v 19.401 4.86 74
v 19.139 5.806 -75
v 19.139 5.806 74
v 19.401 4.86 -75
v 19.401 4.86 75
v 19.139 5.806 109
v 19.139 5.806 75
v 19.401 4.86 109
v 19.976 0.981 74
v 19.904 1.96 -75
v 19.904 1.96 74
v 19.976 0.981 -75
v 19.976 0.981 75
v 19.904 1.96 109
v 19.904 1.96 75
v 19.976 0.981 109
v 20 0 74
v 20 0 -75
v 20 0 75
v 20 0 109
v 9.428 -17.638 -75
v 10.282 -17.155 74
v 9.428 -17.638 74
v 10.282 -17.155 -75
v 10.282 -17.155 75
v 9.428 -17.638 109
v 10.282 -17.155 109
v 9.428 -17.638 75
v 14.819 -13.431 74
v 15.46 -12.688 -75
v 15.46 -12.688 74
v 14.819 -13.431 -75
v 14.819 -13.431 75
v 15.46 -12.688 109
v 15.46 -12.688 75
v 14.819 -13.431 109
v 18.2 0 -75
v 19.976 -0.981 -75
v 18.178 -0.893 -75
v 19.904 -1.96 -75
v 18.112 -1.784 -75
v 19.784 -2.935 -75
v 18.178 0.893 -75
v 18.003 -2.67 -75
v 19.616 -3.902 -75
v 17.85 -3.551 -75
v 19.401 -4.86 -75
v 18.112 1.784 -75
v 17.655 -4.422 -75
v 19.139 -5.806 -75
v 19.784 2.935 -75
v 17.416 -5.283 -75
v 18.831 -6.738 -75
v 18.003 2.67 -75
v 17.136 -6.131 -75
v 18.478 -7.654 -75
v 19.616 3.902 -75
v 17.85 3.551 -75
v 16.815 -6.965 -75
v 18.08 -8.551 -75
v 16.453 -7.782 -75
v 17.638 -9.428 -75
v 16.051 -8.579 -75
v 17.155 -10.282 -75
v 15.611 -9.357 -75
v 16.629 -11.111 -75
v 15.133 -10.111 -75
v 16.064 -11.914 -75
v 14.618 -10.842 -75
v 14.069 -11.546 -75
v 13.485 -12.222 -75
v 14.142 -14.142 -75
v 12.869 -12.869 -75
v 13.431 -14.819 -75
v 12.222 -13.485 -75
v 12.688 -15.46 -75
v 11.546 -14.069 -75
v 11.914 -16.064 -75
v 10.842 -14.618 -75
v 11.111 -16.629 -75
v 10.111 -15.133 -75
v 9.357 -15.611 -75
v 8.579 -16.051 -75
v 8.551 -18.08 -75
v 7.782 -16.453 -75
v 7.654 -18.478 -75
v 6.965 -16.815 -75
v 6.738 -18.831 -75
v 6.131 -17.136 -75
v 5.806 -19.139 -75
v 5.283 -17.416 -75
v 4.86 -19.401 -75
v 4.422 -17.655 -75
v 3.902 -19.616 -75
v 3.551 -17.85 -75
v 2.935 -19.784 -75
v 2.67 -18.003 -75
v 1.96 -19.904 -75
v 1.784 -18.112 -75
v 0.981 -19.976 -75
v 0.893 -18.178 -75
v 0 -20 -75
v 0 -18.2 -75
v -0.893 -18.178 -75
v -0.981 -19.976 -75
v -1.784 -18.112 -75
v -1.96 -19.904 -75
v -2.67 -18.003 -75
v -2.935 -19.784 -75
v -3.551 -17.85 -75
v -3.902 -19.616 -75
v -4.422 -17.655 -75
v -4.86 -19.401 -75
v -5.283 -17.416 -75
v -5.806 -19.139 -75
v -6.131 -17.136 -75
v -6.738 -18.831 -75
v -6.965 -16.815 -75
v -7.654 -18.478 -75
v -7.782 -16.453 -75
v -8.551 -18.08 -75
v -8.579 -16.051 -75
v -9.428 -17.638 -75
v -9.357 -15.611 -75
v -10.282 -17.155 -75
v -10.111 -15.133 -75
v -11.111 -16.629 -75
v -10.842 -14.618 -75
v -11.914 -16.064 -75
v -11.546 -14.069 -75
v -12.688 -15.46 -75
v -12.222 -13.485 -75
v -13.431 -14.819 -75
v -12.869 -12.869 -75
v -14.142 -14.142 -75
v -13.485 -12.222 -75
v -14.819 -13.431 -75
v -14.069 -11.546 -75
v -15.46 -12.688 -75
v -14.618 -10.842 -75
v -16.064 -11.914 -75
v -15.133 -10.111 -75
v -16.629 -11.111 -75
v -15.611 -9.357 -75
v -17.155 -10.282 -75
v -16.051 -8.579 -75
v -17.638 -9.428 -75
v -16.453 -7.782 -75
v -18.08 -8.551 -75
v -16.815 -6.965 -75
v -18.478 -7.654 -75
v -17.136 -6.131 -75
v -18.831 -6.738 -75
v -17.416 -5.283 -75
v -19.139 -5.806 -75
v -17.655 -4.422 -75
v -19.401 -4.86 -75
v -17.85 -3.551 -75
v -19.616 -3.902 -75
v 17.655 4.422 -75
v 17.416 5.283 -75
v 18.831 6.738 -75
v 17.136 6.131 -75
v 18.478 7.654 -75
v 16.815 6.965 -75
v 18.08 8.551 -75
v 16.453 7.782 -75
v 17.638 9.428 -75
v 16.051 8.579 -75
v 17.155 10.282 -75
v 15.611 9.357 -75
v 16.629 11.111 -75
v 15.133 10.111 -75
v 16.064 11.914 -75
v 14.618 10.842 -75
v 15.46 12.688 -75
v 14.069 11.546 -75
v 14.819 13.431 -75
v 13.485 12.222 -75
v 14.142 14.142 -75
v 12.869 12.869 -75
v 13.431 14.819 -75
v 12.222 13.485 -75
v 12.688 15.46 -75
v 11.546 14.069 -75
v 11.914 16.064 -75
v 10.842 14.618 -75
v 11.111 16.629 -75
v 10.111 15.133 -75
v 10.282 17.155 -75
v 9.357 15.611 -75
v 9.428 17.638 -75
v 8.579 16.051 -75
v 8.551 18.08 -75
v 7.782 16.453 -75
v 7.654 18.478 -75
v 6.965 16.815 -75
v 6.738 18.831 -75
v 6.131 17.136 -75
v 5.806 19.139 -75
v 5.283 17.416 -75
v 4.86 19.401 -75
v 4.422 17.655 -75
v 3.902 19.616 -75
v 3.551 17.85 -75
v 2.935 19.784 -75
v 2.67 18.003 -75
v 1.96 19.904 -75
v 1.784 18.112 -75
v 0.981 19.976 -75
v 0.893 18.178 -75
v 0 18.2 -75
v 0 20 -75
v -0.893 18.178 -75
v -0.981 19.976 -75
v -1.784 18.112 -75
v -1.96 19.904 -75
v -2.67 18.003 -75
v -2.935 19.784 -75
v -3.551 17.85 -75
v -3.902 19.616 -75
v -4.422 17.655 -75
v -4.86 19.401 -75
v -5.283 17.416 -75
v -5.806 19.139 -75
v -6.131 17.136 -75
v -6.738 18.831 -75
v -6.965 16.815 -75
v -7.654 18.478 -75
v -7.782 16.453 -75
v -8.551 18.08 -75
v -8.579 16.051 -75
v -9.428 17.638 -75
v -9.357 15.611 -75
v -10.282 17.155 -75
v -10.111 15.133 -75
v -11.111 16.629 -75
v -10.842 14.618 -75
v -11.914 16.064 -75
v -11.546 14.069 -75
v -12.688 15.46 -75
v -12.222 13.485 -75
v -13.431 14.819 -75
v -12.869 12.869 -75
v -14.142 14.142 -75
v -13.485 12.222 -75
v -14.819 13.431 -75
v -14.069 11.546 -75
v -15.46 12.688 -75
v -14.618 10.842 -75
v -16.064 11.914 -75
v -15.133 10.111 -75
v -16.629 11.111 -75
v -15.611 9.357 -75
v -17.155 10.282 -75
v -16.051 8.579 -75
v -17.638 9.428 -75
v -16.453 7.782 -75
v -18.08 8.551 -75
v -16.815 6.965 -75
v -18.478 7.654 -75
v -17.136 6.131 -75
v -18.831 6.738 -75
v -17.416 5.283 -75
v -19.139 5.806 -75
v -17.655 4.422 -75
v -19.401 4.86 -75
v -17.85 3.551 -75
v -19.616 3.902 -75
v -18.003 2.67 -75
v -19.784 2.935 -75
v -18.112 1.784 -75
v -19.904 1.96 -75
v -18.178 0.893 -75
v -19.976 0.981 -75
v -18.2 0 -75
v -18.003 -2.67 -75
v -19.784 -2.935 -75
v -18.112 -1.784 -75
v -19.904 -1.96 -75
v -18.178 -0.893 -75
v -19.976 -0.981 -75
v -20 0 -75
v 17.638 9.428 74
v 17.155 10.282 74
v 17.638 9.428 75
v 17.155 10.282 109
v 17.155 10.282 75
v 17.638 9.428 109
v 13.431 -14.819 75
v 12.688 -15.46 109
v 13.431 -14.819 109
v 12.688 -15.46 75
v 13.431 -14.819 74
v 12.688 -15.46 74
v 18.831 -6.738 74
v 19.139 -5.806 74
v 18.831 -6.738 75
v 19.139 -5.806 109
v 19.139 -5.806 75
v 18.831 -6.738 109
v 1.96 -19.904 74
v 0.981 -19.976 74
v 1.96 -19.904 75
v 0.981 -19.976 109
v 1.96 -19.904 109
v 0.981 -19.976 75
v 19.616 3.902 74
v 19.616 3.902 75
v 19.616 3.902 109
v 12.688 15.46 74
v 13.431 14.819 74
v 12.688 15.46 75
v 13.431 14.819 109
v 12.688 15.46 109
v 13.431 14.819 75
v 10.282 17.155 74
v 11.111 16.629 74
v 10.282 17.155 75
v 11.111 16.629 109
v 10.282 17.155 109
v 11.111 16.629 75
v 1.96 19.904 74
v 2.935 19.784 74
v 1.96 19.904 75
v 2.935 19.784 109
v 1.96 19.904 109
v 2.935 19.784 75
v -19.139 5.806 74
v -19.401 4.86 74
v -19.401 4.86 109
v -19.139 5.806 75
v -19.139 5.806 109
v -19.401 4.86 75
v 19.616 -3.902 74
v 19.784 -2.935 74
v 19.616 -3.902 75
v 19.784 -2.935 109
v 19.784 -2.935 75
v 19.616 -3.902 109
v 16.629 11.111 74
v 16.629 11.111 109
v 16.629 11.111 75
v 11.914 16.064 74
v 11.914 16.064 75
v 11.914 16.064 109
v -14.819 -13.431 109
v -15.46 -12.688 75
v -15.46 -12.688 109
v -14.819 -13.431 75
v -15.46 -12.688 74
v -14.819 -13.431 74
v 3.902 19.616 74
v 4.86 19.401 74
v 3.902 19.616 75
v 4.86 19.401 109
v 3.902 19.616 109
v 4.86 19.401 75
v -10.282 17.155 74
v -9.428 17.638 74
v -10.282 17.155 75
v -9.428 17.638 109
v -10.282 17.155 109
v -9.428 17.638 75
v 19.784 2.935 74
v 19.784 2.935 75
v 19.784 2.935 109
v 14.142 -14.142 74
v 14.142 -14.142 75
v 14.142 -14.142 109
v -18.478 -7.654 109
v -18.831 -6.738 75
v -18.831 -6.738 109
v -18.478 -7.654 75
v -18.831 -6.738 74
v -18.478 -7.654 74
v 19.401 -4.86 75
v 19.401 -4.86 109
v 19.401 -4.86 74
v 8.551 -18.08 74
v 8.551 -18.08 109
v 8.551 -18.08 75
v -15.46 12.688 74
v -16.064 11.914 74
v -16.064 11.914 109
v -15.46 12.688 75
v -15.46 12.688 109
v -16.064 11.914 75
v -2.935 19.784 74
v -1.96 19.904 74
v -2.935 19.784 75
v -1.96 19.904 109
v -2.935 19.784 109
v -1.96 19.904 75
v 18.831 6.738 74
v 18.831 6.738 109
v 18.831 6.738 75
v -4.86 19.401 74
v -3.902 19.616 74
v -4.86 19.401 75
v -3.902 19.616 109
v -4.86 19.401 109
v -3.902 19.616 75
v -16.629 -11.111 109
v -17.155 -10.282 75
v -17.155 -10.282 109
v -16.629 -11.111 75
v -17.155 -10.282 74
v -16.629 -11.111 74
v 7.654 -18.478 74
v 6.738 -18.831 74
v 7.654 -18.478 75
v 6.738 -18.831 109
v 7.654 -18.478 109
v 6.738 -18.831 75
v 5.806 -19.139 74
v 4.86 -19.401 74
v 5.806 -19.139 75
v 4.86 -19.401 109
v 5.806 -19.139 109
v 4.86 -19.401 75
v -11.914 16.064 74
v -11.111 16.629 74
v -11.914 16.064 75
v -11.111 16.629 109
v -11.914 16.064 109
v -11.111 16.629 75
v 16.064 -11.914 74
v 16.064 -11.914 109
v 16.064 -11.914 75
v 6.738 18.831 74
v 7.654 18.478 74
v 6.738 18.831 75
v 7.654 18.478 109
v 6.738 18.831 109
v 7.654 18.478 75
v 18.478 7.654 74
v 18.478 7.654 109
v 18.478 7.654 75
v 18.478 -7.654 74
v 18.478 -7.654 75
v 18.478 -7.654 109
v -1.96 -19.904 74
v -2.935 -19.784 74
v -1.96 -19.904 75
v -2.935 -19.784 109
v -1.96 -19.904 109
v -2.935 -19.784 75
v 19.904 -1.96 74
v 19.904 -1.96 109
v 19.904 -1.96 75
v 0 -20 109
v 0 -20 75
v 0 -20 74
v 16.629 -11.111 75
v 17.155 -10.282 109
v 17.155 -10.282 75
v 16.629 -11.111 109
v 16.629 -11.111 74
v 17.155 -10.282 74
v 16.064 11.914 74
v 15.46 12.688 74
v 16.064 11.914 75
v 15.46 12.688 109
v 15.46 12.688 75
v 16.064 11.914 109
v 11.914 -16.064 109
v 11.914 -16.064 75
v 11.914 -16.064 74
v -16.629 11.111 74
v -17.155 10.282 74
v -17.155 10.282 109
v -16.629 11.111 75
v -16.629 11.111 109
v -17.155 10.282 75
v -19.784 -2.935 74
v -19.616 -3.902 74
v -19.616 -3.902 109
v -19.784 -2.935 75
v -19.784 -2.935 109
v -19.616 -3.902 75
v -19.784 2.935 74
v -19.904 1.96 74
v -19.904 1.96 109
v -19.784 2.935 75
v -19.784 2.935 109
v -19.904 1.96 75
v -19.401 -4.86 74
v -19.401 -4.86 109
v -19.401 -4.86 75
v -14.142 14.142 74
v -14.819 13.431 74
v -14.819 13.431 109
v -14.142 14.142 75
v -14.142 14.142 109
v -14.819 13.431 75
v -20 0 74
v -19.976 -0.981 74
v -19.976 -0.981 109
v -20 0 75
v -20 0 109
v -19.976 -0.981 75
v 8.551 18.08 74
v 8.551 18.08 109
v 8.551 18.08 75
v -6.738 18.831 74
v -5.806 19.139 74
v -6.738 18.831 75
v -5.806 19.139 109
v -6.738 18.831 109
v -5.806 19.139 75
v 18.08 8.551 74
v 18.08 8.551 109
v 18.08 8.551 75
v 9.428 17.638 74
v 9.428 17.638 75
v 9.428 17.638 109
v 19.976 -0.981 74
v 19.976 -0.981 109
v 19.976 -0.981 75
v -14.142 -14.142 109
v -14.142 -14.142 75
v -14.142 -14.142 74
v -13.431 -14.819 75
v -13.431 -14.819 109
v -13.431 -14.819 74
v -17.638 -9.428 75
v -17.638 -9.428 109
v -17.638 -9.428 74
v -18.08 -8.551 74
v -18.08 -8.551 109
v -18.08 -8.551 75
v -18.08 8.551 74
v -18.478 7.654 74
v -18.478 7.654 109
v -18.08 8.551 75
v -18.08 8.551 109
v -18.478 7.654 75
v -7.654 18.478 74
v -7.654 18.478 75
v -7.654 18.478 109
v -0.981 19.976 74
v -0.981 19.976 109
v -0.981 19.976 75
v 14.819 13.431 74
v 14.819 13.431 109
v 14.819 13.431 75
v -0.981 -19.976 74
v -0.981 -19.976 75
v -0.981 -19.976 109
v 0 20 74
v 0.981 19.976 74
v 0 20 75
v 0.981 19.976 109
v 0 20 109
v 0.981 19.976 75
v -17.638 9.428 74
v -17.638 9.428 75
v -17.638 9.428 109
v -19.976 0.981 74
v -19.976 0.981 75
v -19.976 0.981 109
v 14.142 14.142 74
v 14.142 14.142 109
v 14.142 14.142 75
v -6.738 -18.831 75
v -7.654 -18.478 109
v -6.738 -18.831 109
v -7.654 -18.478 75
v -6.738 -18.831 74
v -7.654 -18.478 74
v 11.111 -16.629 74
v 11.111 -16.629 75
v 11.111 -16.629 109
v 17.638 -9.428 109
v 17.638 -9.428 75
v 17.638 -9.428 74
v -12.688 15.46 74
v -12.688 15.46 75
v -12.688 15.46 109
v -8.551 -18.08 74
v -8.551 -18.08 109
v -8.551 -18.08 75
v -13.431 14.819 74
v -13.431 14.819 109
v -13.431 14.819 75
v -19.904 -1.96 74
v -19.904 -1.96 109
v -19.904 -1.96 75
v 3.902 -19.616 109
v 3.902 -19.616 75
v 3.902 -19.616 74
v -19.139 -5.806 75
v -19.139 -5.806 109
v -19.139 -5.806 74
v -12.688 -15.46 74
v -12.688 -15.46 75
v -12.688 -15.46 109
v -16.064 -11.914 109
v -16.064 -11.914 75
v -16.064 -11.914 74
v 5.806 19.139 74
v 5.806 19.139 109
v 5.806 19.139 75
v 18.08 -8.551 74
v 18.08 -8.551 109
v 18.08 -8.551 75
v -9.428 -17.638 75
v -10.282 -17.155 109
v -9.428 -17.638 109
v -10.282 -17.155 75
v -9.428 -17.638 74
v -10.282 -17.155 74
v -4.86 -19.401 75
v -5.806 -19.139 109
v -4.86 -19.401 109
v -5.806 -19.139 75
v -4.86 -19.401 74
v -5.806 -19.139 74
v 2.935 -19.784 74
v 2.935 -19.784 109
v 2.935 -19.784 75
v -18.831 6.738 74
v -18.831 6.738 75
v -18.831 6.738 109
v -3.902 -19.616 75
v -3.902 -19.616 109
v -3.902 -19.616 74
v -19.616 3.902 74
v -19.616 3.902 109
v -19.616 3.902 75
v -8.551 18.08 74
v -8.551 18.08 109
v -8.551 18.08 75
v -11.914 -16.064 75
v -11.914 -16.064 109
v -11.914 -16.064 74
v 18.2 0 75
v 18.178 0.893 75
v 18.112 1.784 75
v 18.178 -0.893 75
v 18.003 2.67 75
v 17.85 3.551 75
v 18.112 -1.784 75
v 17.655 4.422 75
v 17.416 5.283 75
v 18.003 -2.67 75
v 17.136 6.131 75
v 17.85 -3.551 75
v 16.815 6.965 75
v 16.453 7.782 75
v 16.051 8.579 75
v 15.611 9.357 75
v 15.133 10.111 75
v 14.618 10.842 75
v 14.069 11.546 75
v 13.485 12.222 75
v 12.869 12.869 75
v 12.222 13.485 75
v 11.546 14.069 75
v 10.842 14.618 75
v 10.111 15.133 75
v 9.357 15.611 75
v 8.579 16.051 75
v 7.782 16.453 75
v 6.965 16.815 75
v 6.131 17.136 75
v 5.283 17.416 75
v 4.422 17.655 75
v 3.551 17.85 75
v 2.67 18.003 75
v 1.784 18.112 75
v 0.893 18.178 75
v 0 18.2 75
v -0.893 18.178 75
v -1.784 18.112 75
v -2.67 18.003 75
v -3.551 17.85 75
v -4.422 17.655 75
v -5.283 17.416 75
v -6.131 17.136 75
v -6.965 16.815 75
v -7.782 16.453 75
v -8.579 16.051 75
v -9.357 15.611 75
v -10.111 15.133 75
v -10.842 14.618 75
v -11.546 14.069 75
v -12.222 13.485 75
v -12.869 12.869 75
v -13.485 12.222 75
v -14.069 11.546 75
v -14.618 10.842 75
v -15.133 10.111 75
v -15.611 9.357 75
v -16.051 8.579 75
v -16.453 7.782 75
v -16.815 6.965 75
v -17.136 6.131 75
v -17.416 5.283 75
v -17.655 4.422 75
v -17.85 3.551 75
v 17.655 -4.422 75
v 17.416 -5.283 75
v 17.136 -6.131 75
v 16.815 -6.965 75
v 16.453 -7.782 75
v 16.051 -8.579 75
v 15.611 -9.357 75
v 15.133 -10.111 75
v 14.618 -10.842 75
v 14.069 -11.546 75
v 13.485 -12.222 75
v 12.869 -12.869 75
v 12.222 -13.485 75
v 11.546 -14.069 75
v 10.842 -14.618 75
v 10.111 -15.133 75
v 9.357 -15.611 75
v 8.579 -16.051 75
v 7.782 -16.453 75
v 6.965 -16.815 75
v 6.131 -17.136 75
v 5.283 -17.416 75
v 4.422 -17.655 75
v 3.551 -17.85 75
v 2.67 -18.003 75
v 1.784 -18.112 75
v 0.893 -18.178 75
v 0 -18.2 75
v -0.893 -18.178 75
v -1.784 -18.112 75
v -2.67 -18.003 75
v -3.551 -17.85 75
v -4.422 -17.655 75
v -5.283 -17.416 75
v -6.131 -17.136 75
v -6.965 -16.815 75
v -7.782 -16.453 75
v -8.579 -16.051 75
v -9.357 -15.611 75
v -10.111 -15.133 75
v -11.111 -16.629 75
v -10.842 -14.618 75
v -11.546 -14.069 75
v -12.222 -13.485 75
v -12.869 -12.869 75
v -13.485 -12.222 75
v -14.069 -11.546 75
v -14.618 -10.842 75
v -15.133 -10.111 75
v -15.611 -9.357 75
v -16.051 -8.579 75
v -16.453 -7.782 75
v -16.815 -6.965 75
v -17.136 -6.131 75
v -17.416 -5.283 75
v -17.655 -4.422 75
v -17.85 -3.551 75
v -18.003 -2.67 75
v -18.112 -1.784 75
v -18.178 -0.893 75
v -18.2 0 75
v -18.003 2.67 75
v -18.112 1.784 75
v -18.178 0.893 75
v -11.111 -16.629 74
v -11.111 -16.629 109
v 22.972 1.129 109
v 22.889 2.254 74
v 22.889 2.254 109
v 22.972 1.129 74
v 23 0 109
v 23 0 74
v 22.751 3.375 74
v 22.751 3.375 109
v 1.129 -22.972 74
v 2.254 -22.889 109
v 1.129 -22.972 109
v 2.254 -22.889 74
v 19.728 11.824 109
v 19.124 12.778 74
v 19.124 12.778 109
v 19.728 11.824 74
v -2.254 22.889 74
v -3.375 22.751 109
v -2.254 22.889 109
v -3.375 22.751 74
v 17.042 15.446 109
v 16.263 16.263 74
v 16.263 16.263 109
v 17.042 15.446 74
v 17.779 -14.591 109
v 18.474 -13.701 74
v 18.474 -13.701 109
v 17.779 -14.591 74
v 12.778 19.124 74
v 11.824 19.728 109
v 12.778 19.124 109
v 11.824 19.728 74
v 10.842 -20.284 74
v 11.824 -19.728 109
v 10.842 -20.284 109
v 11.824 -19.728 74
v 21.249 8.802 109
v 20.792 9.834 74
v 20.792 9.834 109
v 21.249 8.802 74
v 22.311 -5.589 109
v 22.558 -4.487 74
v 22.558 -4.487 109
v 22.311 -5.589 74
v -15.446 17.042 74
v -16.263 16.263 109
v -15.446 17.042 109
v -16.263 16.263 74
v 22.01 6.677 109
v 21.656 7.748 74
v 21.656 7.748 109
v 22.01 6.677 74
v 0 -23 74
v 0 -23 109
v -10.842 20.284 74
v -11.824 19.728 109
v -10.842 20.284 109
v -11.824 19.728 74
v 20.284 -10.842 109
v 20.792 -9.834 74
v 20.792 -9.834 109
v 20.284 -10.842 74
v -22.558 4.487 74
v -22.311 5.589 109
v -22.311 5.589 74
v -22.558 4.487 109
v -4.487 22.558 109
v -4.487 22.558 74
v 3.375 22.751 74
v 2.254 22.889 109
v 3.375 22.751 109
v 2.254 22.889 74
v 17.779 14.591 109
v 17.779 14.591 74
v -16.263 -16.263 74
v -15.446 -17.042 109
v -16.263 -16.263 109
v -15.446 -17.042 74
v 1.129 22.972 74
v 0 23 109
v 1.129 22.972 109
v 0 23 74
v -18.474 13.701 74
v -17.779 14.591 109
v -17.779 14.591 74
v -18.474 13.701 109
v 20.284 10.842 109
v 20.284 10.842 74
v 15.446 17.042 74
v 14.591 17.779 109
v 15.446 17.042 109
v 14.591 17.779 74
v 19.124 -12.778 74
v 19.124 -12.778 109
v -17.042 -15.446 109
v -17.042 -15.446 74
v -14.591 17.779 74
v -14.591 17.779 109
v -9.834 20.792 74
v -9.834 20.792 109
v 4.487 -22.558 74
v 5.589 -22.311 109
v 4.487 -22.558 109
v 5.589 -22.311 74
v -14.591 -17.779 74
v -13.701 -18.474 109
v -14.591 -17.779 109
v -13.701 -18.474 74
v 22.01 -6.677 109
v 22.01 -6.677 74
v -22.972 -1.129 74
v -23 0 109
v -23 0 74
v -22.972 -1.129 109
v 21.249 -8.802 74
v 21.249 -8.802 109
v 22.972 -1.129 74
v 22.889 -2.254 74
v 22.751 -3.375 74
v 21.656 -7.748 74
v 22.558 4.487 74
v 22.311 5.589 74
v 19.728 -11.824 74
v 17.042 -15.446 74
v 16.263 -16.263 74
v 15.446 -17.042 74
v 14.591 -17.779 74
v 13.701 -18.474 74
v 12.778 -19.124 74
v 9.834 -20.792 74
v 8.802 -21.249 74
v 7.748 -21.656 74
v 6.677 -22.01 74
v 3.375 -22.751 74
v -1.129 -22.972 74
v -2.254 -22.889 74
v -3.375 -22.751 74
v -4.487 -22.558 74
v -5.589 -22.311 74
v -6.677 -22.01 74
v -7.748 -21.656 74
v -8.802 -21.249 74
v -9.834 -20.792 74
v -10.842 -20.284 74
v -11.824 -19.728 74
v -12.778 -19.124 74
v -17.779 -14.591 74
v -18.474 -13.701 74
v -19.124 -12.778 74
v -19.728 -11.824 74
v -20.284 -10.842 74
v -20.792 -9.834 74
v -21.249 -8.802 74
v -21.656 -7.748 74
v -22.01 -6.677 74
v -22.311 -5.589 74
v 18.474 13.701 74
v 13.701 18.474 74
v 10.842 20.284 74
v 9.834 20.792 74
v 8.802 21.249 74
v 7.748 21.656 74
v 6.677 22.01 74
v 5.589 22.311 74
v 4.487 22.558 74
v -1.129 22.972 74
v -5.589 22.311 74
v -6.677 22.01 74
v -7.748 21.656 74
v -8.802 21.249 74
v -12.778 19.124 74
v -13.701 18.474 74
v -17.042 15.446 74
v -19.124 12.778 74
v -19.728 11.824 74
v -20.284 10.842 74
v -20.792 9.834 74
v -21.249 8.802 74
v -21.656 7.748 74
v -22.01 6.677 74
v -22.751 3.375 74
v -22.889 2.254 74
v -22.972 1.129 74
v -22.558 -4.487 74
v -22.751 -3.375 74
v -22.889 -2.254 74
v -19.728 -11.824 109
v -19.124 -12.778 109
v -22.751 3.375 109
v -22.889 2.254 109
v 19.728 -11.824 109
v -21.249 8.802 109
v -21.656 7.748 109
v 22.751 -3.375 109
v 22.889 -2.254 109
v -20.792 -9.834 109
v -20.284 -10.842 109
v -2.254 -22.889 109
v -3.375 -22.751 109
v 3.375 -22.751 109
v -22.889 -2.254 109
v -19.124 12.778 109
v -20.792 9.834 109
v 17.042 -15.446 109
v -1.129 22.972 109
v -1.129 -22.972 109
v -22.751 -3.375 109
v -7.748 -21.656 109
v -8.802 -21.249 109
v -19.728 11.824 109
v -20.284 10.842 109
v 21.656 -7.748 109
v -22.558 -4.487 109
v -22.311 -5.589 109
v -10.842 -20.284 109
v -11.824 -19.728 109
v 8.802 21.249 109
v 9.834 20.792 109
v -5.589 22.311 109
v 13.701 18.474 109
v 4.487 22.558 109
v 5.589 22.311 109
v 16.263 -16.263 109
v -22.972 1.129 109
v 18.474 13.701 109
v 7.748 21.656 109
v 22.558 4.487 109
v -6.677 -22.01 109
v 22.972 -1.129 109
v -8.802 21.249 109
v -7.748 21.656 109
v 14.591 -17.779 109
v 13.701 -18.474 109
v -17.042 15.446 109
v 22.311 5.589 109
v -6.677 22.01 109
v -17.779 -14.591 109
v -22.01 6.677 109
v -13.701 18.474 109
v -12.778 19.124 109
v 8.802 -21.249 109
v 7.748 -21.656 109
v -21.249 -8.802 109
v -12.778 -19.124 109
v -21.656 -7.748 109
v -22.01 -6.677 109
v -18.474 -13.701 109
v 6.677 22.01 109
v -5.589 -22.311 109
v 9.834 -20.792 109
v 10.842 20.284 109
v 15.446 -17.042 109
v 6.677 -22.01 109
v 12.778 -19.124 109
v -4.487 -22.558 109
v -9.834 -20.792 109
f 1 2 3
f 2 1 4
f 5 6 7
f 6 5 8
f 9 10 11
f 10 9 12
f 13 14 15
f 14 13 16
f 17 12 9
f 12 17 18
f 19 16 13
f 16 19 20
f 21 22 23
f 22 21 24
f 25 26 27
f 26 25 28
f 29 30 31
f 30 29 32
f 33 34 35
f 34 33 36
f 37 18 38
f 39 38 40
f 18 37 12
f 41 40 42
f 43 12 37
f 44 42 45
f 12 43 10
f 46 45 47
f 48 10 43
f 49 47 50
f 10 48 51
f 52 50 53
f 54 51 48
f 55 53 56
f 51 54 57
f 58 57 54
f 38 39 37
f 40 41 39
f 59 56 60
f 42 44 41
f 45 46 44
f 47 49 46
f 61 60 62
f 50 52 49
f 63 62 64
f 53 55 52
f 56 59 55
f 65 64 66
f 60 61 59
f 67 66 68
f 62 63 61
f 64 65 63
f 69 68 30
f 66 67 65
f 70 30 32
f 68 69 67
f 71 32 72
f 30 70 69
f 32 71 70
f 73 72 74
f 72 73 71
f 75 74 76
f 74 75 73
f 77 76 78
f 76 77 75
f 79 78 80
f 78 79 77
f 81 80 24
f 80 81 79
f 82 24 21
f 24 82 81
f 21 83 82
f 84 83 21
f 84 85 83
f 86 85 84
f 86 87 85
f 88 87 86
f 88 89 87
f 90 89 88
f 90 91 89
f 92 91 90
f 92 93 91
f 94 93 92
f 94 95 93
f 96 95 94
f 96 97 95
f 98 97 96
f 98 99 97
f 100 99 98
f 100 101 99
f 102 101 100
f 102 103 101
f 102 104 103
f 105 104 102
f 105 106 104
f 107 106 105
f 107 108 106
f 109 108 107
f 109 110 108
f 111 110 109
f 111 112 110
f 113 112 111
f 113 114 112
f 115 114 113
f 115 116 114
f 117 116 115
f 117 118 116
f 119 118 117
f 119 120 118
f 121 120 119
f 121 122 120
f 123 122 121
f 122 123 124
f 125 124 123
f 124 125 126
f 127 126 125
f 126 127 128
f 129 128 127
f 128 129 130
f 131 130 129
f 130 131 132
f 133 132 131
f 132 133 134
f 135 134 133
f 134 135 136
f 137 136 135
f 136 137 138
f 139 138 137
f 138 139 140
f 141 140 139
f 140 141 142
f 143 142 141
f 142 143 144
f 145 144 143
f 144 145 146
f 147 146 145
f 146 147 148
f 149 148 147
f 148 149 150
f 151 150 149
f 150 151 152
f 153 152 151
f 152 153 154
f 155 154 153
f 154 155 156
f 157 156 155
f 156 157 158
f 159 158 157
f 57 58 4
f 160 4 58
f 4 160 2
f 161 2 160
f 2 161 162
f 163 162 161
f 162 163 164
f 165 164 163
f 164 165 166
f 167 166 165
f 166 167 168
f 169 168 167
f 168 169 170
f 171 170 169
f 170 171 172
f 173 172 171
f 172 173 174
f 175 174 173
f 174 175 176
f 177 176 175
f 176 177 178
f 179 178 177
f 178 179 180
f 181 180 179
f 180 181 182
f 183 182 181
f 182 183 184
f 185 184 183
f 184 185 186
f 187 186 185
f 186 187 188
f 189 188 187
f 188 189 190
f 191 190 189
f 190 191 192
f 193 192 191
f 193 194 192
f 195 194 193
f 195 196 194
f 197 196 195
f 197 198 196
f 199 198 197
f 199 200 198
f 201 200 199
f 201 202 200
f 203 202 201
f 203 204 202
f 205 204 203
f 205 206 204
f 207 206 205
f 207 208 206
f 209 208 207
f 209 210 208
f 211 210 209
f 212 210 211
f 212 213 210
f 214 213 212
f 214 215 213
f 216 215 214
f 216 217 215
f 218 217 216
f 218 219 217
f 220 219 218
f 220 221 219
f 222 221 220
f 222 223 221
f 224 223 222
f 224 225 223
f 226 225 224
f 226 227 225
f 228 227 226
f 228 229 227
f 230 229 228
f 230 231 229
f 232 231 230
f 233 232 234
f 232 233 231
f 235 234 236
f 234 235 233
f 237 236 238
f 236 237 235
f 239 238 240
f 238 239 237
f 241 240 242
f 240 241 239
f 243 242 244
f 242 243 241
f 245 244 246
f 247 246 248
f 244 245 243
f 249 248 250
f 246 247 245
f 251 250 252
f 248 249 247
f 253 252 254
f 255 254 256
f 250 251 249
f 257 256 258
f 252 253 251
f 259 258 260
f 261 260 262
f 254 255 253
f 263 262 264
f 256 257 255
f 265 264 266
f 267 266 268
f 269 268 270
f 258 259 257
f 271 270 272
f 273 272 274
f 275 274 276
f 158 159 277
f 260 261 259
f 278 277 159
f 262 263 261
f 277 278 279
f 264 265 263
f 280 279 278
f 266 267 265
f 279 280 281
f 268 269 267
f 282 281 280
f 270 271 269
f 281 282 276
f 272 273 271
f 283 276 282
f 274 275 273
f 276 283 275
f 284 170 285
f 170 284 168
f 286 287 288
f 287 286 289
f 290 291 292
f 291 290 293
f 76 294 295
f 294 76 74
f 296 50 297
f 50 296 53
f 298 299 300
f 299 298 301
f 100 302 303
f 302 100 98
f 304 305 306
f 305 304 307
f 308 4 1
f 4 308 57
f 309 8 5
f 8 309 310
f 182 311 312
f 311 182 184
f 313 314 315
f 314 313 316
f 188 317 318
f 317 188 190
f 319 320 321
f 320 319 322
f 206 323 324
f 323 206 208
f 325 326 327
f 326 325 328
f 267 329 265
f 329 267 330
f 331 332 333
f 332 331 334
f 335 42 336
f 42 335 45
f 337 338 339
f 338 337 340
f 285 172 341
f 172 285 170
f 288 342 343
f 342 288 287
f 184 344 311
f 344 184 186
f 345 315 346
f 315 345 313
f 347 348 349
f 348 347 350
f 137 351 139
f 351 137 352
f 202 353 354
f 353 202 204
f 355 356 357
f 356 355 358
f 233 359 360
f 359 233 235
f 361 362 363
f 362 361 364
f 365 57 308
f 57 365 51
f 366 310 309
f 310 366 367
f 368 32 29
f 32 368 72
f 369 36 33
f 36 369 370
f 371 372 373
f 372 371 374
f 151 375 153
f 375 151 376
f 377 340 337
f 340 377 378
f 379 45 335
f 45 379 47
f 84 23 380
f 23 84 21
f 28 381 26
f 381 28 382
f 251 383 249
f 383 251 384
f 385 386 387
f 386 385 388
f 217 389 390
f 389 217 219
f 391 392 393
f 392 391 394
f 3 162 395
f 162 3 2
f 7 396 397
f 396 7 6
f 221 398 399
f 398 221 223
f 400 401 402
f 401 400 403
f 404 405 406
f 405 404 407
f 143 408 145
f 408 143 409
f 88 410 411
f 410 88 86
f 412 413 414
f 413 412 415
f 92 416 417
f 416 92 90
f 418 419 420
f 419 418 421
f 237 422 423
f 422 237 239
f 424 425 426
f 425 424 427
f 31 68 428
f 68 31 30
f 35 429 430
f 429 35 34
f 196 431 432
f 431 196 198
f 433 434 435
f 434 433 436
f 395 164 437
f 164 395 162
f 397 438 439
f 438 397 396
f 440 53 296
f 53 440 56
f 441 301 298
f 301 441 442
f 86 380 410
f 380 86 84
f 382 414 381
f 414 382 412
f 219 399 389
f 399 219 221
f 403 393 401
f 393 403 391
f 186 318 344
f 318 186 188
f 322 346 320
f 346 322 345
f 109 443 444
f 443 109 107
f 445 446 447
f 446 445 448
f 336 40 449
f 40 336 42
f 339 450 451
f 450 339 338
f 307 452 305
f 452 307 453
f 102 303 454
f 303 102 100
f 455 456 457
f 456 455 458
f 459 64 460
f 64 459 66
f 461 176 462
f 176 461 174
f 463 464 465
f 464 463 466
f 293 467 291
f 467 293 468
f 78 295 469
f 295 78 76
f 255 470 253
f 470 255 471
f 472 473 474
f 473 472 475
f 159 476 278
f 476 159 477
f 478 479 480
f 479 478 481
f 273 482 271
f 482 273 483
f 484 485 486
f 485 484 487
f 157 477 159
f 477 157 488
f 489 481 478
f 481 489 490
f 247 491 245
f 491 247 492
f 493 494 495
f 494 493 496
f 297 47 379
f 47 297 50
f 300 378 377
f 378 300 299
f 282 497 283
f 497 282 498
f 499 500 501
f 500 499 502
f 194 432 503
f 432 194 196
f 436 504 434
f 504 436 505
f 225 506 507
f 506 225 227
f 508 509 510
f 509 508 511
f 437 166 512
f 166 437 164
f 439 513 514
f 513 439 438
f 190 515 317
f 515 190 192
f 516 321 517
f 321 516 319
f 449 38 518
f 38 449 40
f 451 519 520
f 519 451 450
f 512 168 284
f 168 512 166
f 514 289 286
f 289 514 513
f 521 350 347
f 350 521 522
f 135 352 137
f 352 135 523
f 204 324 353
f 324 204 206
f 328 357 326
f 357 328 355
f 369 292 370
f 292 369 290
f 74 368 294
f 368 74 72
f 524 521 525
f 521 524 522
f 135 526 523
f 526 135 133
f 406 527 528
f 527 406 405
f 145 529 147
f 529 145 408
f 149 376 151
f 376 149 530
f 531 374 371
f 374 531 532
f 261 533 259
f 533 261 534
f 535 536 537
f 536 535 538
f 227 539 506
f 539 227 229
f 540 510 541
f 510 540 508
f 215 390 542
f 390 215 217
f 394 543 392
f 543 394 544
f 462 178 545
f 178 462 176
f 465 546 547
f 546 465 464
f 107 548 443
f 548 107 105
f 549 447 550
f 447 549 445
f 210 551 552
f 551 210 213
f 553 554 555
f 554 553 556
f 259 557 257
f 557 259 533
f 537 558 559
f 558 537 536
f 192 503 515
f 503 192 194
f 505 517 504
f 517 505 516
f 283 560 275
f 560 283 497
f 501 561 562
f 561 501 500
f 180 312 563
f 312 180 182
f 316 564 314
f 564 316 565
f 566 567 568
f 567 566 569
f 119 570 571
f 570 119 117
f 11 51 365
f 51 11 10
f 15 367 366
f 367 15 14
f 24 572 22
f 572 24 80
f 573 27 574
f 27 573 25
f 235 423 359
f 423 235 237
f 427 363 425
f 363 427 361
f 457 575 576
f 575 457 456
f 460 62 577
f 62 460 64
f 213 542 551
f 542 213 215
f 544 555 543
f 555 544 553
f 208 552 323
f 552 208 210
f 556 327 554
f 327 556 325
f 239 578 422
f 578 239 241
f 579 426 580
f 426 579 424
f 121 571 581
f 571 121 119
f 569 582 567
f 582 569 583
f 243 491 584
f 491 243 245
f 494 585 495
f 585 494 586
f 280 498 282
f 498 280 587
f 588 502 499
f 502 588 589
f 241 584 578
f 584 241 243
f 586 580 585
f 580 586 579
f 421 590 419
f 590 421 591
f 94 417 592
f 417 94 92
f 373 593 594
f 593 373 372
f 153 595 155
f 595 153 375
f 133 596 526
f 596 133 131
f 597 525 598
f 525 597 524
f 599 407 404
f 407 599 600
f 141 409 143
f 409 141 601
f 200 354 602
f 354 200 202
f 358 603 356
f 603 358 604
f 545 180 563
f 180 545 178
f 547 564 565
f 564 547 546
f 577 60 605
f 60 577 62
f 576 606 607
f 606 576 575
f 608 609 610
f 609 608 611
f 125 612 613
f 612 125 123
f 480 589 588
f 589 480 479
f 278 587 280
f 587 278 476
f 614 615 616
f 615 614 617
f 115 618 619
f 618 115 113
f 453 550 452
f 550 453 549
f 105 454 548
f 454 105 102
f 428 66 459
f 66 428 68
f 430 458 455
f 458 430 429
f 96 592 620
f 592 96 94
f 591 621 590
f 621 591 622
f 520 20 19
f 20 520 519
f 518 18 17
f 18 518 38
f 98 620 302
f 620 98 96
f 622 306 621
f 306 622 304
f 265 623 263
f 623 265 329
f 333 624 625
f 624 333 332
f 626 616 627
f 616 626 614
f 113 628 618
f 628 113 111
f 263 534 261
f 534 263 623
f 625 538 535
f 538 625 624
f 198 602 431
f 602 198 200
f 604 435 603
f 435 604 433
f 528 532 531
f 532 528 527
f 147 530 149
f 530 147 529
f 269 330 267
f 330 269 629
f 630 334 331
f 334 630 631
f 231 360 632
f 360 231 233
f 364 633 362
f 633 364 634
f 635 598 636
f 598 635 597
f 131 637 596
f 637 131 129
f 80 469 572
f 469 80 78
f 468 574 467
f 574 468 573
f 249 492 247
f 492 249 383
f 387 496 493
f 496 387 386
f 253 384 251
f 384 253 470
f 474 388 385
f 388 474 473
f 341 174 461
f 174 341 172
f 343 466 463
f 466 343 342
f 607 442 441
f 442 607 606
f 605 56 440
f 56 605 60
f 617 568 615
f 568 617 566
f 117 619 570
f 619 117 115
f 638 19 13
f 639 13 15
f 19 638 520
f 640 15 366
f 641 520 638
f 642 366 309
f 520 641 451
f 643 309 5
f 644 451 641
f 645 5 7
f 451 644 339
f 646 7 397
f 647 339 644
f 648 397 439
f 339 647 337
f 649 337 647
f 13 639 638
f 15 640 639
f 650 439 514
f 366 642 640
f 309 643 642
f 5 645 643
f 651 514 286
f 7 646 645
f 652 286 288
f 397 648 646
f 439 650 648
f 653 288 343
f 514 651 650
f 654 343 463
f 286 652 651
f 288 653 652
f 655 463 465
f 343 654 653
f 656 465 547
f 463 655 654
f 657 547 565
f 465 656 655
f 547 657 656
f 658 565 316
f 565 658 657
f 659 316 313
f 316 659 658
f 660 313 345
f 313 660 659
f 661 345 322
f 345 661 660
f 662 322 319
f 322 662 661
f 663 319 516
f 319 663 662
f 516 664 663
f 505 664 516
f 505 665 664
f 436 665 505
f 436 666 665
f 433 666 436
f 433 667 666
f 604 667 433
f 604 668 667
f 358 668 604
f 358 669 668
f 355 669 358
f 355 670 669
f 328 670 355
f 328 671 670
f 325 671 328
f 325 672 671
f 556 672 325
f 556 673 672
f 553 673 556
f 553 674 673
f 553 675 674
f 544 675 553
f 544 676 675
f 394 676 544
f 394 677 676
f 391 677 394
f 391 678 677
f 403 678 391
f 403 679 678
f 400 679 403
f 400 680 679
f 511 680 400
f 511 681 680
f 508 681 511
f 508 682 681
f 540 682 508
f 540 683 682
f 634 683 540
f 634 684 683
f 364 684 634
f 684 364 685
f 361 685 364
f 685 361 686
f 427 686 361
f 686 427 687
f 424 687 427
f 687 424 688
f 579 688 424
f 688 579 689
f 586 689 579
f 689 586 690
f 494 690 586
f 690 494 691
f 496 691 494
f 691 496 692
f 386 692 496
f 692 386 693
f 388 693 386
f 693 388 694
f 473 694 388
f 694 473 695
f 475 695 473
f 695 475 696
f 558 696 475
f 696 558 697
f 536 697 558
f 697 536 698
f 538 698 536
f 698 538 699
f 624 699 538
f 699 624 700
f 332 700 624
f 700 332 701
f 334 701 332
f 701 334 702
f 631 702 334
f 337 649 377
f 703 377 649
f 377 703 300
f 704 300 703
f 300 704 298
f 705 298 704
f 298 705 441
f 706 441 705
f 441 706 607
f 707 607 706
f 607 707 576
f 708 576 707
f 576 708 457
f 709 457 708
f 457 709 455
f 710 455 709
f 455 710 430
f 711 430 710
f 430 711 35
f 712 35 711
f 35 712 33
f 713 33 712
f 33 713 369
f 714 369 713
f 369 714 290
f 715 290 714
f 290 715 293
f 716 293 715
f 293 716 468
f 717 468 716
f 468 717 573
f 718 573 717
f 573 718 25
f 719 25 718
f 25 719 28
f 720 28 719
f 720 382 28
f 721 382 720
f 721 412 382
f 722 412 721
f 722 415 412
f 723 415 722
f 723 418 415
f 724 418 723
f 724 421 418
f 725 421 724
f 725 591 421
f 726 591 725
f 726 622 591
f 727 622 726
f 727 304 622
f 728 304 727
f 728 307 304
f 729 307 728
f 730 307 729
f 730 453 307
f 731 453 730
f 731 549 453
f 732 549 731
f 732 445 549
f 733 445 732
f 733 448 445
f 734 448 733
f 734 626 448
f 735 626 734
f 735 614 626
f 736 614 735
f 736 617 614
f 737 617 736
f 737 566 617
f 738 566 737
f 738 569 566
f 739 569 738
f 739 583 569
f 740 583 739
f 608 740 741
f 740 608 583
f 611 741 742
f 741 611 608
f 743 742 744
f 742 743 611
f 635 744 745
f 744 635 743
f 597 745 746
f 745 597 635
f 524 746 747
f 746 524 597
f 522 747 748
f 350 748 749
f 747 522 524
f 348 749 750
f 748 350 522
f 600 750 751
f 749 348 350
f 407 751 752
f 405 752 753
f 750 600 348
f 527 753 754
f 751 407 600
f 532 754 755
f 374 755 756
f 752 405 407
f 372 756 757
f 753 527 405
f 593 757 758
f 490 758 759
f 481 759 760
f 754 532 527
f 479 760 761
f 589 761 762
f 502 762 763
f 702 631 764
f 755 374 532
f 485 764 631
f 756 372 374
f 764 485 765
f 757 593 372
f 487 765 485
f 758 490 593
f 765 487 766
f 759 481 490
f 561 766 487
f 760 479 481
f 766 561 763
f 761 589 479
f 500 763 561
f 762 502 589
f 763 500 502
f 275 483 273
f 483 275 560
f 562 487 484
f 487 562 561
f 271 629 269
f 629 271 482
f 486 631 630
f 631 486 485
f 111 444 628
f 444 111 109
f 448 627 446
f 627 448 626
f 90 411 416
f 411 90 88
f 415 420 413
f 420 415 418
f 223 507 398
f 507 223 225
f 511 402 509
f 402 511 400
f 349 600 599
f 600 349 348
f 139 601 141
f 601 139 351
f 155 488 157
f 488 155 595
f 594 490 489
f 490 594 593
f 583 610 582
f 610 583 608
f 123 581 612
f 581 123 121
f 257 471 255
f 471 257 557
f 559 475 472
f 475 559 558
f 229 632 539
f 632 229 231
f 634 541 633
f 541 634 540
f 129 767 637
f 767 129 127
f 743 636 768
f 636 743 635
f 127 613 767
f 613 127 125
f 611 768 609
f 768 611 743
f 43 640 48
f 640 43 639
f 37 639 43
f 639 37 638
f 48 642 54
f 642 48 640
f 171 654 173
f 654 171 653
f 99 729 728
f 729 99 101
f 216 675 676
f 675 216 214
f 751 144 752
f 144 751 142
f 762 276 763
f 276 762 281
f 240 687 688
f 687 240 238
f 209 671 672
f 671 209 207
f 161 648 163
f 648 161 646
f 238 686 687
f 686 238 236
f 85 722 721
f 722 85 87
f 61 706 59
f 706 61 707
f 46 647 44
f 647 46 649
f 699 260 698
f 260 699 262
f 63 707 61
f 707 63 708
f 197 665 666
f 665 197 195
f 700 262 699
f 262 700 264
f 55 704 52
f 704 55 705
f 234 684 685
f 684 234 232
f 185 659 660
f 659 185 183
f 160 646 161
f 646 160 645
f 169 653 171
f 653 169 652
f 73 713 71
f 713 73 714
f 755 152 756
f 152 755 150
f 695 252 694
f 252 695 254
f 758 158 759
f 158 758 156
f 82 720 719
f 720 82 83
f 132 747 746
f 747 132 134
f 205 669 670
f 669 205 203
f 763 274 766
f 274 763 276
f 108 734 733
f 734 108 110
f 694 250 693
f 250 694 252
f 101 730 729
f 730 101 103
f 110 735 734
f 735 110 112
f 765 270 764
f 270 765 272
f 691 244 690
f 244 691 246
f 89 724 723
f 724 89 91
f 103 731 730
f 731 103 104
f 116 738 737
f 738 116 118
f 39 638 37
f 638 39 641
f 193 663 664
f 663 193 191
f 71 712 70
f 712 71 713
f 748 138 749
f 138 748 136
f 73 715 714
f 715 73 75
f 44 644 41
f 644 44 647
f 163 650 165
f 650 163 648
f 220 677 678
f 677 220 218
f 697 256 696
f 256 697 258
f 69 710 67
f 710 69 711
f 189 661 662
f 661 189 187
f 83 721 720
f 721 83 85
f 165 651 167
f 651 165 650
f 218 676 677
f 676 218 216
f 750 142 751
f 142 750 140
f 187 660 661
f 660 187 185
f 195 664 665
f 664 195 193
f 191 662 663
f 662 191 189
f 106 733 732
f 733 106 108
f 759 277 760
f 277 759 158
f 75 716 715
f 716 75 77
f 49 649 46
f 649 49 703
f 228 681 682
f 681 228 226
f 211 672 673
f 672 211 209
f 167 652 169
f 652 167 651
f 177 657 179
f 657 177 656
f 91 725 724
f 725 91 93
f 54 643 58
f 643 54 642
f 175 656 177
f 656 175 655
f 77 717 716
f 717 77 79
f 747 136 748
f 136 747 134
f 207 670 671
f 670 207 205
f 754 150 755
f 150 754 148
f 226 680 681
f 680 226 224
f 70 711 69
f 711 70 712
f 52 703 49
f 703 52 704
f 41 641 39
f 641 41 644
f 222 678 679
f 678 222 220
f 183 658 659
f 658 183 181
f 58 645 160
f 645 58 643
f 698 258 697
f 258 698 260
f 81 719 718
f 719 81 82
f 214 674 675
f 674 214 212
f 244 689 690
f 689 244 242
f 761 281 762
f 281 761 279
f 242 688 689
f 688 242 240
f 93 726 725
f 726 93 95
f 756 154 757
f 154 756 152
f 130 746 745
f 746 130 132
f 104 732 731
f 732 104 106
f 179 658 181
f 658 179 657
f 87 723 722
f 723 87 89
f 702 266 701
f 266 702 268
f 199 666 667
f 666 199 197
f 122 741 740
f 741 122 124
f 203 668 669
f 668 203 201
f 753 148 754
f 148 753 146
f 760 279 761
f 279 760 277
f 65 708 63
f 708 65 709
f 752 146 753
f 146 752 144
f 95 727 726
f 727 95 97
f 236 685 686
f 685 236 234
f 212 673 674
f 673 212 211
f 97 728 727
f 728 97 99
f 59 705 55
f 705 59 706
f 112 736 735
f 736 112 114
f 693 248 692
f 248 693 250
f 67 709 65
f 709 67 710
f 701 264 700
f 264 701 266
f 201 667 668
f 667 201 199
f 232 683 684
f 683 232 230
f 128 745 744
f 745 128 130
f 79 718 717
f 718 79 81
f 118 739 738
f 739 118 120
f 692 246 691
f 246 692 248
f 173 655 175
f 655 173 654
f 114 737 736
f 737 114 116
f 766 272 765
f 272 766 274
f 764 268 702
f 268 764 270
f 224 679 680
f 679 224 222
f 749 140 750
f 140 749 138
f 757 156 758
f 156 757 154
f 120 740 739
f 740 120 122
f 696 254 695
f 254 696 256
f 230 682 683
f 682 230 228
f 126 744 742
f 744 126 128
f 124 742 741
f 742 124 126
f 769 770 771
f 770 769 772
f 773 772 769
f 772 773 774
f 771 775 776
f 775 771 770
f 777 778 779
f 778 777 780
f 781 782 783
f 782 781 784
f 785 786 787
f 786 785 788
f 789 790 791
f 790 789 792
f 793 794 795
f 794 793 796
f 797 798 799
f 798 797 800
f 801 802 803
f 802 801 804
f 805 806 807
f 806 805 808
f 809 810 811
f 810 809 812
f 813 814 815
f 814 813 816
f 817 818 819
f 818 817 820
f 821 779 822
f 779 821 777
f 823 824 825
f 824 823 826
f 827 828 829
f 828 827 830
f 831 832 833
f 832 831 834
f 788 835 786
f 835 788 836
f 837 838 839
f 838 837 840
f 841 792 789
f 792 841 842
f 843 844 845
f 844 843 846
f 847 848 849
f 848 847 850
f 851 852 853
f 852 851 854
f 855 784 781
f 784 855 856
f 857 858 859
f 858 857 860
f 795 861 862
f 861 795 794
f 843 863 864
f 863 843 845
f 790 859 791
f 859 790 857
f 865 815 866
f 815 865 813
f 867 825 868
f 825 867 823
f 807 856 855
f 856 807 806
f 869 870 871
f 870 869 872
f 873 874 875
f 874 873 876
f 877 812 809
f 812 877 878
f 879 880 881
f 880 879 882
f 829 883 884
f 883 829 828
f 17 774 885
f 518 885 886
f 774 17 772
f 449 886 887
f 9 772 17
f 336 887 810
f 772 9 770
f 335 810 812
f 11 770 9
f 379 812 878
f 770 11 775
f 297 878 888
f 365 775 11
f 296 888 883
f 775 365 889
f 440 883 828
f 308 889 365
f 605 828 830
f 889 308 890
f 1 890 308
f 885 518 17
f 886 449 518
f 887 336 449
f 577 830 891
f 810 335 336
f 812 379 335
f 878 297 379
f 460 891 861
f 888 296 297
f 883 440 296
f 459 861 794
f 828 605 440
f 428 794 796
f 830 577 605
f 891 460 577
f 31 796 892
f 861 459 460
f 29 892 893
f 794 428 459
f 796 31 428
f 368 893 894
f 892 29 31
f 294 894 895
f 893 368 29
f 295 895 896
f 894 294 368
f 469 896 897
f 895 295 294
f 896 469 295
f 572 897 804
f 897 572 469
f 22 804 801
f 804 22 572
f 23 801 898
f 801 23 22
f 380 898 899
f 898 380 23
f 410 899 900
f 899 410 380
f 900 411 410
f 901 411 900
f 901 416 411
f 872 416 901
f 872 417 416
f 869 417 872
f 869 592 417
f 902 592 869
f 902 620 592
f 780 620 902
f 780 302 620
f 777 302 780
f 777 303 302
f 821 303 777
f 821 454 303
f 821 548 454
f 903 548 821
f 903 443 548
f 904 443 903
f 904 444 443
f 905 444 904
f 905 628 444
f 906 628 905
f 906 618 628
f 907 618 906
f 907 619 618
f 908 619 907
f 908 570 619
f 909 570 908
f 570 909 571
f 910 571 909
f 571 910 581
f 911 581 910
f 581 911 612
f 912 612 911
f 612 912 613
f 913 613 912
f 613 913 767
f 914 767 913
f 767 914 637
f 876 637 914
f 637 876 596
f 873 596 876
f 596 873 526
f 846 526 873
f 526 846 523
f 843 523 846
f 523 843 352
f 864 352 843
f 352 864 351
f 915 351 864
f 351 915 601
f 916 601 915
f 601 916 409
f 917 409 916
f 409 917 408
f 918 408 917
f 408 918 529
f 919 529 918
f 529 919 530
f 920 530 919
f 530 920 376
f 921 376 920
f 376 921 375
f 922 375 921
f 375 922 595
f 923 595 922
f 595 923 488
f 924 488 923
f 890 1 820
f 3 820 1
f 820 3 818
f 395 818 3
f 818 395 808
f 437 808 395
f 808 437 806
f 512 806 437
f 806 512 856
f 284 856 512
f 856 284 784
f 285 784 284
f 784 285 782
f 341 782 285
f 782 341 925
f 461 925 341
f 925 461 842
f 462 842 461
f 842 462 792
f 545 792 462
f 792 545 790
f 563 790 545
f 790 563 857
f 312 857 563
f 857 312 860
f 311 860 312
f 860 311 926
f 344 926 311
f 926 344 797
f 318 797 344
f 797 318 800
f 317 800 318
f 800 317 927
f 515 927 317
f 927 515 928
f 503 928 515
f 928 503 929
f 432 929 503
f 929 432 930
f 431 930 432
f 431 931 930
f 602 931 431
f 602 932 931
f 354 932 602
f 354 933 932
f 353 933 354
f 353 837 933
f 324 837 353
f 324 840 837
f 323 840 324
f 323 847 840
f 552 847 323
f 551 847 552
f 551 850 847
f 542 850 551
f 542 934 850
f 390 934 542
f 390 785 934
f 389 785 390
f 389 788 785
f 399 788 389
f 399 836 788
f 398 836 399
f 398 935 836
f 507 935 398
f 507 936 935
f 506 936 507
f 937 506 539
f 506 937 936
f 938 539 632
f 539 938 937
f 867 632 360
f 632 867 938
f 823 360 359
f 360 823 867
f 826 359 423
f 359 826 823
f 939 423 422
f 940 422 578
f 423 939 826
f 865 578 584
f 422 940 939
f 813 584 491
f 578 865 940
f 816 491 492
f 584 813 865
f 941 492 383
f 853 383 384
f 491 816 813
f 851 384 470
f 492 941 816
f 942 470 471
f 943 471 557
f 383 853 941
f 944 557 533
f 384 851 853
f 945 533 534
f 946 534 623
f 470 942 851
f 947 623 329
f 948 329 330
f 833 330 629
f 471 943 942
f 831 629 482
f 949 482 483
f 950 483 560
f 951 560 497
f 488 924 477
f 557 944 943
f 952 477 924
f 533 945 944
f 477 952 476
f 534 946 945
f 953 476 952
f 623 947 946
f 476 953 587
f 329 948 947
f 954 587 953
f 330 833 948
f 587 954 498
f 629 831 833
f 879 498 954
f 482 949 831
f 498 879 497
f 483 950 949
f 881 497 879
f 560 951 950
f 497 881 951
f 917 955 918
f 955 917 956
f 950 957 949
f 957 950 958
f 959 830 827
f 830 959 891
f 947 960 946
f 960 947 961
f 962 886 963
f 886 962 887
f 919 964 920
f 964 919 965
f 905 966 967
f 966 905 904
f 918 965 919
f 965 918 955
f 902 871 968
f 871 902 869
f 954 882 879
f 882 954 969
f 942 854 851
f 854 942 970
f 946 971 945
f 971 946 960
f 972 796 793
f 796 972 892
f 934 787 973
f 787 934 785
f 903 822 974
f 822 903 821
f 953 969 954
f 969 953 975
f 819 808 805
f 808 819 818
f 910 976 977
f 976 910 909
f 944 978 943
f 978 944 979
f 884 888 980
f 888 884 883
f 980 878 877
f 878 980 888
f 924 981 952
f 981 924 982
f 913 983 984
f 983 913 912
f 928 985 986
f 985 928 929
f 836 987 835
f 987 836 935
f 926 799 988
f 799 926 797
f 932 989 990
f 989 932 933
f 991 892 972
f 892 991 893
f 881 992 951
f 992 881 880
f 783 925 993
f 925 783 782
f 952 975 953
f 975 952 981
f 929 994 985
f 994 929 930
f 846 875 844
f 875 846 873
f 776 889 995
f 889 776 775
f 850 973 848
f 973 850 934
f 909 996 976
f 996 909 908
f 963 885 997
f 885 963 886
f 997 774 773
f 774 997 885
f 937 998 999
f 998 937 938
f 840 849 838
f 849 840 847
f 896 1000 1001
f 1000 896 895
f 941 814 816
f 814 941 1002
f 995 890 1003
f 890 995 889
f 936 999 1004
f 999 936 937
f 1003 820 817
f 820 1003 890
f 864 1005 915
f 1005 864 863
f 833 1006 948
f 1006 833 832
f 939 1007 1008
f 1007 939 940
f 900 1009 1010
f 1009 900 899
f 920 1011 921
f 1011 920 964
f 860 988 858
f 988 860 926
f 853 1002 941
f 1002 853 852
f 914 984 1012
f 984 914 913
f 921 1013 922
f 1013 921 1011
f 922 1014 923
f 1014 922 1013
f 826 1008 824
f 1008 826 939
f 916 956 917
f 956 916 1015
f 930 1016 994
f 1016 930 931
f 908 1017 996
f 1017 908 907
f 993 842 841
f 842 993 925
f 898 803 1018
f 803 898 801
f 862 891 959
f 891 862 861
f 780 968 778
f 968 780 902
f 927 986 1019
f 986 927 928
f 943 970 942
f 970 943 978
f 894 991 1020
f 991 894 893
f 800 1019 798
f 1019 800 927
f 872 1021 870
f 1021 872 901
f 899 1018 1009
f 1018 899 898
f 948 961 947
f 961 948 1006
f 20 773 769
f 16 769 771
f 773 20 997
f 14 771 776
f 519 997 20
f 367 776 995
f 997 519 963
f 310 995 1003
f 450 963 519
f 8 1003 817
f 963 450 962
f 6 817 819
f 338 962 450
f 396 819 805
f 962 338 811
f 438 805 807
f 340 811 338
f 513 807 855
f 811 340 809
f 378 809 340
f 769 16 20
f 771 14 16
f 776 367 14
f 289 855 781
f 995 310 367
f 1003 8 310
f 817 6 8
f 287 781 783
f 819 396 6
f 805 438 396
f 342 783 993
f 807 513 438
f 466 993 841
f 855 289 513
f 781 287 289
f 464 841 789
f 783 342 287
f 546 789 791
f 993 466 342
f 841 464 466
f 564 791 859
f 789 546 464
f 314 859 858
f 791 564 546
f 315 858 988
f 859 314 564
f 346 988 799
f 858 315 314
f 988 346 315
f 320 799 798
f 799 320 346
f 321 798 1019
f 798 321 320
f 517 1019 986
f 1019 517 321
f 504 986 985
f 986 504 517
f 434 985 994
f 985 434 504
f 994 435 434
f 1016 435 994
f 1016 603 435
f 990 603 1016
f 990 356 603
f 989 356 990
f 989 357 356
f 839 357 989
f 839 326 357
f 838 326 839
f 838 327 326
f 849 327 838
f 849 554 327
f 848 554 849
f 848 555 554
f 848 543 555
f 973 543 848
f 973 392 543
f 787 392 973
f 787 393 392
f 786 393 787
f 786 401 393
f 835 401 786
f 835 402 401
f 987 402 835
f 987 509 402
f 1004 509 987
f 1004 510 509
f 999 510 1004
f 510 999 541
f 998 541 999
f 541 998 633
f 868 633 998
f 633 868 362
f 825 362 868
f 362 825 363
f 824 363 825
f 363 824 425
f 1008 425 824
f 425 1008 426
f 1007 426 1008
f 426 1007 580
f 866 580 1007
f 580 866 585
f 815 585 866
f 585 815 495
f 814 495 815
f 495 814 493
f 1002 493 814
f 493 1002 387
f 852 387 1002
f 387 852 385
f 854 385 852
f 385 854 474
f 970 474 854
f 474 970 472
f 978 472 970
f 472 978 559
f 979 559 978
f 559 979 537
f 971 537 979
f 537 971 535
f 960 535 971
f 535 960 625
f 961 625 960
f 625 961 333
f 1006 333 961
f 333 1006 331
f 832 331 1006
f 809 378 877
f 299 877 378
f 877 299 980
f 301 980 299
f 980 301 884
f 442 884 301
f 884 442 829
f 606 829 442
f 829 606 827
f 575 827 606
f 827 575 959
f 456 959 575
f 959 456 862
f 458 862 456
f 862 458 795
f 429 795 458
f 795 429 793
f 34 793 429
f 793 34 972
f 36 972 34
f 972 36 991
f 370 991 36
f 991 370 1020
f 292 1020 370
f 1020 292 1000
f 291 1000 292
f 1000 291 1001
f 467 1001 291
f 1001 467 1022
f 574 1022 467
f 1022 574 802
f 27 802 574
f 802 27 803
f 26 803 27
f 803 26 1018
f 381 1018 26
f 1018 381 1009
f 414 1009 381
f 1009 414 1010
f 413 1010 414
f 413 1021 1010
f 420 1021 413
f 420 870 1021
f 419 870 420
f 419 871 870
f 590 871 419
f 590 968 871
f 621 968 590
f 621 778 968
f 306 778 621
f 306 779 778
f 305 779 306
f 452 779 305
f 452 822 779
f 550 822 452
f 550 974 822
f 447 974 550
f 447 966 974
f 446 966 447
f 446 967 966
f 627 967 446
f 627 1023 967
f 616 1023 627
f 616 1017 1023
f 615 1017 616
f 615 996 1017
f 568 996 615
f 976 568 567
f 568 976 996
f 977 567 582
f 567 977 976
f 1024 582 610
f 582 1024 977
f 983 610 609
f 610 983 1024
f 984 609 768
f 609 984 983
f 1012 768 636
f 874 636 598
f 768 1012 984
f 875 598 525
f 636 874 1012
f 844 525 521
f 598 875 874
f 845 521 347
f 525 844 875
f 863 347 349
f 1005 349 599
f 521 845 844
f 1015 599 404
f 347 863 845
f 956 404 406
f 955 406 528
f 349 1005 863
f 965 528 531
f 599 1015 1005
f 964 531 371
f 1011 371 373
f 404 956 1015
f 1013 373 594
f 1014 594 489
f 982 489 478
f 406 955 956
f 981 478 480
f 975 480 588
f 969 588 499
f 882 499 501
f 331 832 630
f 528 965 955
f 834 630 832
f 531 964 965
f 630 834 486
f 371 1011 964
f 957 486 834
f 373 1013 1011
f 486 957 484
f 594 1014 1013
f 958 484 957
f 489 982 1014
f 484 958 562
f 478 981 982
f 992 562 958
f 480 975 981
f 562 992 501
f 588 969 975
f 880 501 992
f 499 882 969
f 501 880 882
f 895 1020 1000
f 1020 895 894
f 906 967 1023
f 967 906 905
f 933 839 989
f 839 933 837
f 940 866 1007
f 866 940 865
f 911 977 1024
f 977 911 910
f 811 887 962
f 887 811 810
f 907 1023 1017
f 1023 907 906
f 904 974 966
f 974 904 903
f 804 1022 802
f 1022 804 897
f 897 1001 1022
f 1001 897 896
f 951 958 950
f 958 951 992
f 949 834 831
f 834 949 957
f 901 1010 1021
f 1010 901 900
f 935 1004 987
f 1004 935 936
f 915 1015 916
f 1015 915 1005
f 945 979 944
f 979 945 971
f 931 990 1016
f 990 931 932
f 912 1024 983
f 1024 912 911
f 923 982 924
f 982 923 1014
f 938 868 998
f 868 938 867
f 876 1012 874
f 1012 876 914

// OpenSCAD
// Parameters
pipe_standard = 1; //[1:1:1]
nominal_diameter = 40; //[20:80:1]
length_mm = 150; //[75:300:1]
ht40_outer_diameter = 40; //[35:50:0.5]
wall_thickness = 1.8; //[1:3.6:0.1]
fit_socket_length = 35; //[20:70:1]
fit_socket_od_extra = 6; //[2:12:0.5]
fit_socket_wall_extra = 1.2; //[0.5:3:0.1]
fit_stop_ring_length = 4; //[2:10:0.5]
fit_stop_ring_radial = 1.2; //[0.5:3:0.1]
overlap = 1; //[0.5:2:0.1]

$fn = 128;

module ht_pipe() {
  od = ht40_outer_diameter;
  r_outer = od/2;
  r_inner = r_outer - wall_thickness;

  socket_od = od + fit_socket_od_extra;
  r_socket_outer = socket_od/2;

  r_socket_inner = r_socket_outer - (wall_thickness + fit_socket_wall_extra);

  // Safety clamps
  r_outer_ok = max(0.01, r_outer);
  r_inner_ok = max(0.01, min(r_inner, r_outer_ok - 0.01));
  r_socket_outer_ok = max(0.01, r_socket_outer);
  r_socket_inner_ok = max(0.01, min(r_socket_inner, r_socket_outer_ok - 0.01));

  // Place socket so its inner end overlaps into the main pipe by 'overlap'
  // Main pipe spans [-L/2, +L/2]
  // Socket spans [z - Ls/2, z + Ls/2]
  // Set socket bottom = +L/2 - overlap  => z = +L/2 - overlap + Ls/2
  z_socket_c = length_mm/2 - overlap + fit_socket_length/2;

  // Stop ring location: near the outer mouth of the socket (top end)
  z_ring_c_local = fit_socket_length/2 - fit_stop_ring_length/2;

  color([0.85, 0.85, 0.8])
  union() {
    // Main pipe tube
    difference() {
      cylinder(h=length_mm, r=r_outer_ok, center=true);
      cylinder(h=length_mm + 2*overlap, r=r_inner_ok, center=true);
    }

    // Bell/socket end (connected via overlap)
    translate([0, 0, z_socket_c])
    difference() {
      cylinder(h=fit_socket_length, r=r_socket_outer_ok, center=true);

      // Socket bore
      cylinder(h=fit_socket_length + 2*overlap, r=r_socket_inner_ok, center=true);

      // Internal stop ring: locally reduce bore near the mouth
      translate([0, 0, z_ring_c_local])
        cylinder(
          h=fit_stop_ring_length + 2*overlap,
          r=max(0.01, r_socket_inner_ok - fit_stop_ring_radial),
          center=true
        );
    }
  }
}

ht_pipe();
